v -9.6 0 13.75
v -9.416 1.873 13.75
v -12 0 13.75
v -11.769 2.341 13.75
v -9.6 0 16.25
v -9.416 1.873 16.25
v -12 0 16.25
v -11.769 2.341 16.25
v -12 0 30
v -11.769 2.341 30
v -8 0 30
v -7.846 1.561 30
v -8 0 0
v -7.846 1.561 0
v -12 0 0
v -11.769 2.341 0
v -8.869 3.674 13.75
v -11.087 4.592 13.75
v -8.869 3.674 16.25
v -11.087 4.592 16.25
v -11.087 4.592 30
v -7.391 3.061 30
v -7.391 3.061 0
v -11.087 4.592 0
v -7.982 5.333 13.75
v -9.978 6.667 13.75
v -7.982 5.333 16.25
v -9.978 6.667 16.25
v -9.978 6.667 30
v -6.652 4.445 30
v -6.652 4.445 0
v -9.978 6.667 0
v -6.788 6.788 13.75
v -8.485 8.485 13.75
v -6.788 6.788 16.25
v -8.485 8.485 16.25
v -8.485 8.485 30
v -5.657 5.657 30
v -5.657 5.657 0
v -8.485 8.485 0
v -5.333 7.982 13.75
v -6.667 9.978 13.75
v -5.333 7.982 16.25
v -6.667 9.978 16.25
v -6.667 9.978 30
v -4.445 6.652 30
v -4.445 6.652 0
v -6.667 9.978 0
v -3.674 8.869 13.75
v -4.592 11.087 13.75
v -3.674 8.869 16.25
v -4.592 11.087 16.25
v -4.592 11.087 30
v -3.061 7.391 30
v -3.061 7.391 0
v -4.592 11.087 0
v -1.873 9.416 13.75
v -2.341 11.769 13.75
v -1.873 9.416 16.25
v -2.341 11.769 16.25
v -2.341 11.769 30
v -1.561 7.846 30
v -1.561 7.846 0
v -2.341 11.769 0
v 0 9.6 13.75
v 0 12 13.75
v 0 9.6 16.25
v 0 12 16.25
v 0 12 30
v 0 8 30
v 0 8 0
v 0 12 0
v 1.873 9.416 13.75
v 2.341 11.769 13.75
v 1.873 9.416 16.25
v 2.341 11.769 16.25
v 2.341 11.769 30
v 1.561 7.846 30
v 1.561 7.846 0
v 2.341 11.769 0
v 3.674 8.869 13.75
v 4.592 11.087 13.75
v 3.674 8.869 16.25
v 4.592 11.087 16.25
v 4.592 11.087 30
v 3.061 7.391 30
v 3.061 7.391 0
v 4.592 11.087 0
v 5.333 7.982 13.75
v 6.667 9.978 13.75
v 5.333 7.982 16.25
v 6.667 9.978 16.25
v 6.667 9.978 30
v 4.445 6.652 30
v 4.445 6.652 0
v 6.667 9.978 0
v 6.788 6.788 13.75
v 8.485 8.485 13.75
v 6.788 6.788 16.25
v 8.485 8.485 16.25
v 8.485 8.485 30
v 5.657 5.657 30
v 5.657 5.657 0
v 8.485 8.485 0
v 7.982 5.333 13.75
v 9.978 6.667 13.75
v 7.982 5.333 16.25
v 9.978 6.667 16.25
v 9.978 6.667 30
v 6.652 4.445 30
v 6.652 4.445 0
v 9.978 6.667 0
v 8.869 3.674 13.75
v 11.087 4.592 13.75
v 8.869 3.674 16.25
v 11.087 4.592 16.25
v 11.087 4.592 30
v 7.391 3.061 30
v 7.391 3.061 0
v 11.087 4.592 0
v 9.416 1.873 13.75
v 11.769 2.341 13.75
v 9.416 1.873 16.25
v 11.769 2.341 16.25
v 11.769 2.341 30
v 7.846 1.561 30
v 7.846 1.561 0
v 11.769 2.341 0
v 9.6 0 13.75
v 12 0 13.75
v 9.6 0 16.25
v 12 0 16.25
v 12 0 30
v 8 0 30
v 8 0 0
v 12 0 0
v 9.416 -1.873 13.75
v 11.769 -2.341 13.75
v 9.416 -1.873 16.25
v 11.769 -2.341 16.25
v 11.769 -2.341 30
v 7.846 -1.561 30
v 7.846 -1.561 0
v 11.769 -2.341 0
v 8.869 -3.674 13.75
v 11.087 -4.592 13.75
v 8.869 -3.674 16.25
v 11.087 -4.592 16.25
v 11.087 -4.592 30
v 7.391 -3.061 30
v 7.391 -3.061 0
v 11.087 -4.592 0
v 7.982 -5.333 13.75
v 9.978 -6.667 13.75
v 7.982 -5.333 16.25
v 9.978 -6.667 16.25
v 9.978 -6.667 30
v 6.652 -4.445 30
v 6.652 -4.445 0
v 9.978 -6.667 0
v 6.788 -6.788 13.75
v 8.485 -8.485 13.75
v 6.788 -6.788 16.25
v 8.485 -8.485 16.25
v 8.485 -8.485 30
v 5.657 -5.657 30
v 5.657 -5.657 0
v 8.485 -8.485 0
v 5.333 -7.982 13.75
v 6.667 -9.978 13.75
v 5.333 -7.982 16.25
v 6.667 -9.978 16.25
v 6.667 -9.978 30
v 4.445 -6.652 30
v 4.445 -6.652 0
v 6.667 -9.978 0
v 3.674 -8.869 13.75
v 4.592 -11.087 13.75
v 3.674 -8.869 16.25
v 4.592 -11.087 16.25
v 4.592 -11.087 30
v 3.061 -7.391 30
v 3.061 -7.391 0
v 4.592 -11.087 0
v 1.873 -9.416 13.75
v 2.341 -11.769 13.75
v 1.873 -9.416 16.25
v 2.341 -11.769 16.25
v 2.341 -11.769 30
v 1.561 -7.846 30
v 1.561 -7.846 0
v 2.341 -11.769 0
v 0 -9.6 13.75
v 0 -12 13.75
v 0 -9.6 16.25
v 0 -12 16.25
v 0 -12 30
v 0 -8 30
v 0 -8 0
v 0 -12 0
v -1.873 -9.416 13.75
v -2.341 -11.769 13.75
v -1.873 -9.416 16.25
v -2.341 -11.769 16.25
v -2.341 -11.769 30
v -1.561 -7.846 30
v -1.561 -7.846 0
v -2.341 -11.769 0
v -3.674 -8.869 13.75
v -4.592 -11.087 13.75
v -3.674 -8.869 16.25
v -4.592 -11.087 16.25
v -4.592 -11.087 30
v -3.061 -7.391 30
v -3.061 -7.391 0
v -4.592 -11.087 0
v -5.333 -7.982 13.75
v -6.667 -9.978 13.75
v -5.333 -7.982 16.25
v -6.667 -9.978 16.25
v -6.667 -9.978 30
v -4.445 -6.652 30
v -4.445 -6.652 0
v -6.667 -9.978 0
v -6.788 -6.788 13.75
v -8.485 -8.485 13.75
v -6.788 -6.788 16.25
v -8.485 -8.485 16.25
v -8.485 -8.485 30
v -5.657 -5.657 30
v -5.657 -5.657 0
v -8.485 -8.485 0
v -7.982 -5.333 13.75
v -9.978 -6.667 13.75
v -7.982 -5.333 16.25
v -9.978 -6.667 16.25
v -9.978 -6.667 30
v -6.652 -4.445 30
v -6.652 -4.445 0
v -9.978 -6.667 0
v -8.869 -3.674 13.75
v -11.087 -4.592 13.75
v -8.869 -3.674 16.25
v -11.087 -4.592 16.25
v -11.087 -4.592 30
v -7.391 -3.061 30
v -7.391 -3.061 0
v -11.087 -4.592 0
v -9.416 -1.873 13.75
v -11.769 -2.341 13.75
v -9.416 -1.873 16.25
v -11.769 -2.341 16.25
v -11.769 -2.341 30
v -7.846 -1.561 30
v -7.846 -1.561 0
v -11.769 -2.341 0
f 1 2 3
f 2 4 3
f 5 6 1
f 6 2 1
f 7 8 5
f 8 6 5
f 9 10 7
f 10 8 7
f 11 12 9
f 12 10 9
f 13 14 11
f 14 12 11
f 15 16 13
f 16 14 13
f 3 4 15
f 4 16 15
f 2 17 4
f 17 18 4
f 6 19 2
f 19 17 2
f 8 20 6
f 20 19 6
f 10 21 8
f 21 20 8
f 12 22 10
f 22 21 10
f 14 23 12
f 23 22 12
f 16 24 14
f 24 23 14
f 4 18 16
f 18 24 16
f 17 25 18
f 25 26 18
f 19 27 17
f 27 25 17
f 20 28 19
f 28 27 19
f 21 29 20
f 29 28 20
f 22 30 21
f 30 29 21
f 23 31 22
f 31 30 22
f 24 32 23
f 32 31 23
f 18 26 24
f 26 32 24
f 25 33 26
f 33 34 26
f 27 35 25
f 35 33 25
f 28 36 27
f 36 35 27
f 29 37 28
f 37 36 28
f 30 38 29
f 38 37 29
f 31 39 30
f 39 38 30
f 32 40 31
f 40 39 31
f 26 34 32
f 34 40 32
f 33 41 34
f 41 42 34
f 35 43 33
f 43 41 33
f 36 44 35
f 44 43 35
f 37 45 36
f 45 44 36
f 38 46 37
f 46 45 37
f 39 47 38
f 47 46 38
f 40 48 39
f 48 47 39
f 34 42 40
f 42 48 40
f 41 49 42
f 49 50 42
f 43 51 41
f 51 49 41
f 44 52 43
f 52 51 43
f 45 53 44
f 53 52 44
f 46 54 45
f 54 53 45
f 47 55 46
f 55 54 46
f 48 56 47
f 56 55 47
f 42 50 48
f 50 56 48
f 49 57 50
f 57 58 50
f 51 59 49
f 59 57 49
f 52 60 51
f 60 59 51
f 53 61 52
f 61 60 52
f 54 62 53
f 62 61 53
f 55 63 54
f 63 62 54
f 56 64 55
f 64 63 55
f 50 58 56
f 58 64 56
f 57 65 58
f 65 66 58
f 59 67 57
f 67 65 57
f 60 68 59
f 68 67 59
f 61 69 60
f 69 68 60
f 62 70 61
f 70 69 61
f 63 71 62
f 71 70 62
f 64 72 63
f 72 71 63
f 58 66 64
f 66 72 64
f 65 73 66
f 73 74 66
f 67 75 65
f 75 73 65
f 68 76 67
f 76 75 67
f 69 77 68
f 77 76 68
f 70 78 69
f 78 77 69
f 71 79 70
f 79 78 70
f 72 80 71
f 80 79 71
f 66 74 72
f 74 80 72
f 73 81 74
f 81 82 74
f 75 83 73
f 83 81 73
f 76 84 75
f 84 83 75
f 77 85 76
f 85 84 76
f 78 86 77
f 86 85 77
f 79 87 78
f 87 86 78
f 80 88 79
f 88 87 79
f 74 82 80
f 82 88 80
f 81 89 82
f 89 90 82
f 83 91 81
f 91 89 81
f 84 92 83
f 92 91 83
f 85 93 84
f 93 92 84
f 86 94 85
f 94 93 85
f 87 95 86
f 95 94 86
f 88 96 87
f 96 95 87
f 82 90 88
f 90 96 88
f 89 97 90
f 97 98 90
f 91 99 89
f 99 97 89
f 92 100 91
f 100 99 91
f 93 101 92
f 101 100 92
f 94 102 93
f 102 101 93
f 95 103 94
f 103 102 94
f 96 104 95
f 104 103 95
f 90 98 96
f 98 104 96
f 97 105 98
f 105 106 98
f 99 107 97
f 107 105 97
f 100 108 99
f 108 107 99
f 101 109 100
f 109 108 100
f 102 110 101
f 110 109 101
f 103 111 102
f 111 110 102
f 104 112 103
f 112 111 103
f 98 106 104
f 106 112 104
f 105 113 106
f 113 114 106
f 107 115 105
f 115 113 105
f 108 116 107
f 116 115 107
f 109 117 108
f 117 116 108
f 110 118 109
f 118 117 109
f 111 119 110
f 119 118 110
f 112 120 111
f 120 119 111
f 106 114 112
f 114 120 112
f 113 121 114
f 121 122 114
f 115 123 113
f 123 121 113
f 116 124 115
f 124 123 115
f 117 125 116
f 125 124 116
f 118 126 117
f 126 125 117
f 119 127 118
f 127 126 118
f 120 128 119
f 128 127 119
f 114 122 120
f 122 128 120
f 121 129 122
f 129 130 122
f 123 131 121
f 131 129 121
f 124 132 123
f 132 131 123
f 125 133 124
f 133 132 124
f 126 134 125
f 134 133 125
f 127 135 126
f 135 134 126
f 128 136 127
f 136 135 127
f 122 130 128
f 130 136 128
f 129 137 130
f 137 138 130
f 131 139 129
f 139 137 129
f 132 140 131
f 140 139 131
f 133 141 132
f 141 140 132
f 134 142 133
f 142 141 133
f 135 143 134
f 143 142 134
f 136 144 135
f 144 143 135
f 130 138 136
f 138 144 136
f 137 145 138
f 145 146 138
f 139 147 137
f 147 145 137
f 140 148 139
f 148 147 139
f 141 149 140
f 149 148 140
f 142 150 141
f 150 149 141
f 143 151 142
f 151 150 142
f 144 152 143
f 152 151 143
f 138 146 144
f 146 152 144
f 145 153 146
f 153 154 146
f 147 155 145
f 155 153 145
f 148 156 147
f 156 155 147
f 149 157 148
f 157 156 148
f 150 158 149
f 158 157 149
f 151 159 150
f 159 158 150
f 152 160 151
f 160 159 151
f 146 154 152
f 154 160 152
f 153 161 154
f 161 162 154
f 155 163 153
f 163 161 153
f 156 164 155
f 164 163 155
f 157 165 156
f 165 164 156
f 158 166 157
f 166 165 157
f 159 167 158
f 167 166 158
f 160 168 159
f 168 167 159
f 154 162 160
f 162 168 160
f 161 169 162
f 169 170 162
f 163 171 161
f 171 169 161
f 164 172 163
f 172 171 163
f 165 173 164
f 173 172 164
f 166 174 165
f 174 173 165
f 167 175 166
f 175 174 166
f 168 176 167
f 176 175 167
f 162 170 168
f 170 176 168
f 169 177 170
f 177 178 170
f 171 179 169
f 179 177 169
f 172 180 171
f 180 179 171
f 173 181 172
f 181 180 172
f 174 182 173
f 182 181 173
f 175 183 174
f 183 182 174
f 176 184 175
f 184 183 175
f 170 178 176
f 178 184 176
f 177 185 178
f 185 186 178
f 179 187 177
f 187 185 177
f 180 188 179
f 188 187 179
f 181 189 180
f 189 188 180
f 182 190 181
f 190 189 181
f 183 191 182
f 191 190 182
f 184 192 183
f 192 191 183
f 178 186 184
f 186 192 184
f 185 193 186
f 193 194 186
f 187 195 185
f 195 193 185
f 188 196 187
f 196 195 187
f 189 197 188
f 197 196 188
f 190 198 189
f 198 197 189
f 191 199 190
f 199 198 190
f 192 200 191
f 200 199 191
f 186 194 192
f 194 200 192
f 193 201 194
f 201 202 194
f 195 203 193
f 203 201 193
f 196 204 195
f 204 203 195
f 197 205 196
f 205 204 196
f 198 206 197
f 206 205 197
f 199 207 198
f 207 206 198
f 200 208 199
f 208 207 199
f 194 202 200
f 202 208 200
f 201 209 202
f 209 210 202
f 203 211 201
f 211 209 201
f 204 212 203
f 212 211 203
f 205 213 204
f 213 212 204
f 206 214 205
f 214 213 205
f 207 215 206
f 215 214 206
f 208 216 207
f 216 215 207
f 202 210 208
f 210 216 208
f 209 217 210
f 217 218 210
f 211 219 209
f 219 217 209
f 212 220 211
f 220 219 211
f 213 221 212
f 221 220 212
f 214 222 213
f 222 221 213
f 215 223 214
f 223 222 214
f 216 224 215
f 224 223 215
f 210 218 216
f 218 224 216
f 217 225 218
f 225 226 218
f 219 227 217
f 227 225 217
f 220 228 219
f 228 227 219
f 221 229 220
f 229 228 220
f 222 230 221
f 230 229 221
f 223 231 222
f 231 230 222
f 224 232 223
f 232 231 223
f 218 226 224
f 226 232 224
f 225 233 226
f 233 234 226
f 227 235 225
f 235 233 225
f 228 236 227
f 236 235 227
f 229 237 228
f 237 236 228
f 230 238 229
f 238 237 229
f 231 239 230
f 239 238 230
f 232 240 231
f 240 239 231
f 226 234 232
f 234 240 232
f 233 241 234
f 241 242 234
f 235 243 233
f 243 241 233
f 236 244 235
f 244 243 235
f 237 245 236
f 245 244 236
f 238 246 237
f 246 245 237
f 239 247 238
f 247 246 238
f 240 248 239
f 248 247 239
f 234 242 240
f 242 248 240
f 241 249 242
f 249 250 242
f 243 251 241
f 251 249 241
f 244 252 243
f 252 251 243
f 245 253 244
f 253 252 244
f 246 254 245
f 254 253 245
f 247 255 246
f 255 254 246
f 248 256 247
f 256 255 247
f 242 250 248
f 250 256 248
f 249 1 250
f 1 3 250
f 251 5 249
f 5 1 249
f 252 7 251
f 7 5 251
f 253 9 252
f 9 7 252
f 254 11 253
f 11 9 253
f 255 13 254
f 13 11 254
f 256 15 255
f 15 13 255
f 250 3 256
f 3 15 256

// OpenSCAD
$fn = 32;

// ----------------------------------------------------------------------
// Grooved revolve: stepped, bore R8
// ----------------------------------------------------------------------

// --- parameters (mm) ---
bore_r = 8;               // bore radius
outer_r = 12;             // outer radius of the body
total_h = 30;             // overall height, Z
wall = 4;                 // radial wall thickness
groove_w = 2.5;           // groove width
groove_d = 2.4;           // groove depth
grooves = 1;              // number of outer grooves

bbox_x = 2 * outer_r;  // full diameter
bore_d = 2 * bore_r;  // bore diameter
body_d = 2 * outer_r;  // body diameter
revolve_angle = 360;  // full turn around the Z axis

profile = [[8, 0], [12, 0], [12, 13.75], [9.6, 13.75], [9.6, 16.25], [12, 16.25], [12, 30], [8, 30]];  // primary outline, 8 points, counter clockwise

// --- the one profile operation ---
rotate_extrude(angle = revolve_angle) polygon(points = profile);
